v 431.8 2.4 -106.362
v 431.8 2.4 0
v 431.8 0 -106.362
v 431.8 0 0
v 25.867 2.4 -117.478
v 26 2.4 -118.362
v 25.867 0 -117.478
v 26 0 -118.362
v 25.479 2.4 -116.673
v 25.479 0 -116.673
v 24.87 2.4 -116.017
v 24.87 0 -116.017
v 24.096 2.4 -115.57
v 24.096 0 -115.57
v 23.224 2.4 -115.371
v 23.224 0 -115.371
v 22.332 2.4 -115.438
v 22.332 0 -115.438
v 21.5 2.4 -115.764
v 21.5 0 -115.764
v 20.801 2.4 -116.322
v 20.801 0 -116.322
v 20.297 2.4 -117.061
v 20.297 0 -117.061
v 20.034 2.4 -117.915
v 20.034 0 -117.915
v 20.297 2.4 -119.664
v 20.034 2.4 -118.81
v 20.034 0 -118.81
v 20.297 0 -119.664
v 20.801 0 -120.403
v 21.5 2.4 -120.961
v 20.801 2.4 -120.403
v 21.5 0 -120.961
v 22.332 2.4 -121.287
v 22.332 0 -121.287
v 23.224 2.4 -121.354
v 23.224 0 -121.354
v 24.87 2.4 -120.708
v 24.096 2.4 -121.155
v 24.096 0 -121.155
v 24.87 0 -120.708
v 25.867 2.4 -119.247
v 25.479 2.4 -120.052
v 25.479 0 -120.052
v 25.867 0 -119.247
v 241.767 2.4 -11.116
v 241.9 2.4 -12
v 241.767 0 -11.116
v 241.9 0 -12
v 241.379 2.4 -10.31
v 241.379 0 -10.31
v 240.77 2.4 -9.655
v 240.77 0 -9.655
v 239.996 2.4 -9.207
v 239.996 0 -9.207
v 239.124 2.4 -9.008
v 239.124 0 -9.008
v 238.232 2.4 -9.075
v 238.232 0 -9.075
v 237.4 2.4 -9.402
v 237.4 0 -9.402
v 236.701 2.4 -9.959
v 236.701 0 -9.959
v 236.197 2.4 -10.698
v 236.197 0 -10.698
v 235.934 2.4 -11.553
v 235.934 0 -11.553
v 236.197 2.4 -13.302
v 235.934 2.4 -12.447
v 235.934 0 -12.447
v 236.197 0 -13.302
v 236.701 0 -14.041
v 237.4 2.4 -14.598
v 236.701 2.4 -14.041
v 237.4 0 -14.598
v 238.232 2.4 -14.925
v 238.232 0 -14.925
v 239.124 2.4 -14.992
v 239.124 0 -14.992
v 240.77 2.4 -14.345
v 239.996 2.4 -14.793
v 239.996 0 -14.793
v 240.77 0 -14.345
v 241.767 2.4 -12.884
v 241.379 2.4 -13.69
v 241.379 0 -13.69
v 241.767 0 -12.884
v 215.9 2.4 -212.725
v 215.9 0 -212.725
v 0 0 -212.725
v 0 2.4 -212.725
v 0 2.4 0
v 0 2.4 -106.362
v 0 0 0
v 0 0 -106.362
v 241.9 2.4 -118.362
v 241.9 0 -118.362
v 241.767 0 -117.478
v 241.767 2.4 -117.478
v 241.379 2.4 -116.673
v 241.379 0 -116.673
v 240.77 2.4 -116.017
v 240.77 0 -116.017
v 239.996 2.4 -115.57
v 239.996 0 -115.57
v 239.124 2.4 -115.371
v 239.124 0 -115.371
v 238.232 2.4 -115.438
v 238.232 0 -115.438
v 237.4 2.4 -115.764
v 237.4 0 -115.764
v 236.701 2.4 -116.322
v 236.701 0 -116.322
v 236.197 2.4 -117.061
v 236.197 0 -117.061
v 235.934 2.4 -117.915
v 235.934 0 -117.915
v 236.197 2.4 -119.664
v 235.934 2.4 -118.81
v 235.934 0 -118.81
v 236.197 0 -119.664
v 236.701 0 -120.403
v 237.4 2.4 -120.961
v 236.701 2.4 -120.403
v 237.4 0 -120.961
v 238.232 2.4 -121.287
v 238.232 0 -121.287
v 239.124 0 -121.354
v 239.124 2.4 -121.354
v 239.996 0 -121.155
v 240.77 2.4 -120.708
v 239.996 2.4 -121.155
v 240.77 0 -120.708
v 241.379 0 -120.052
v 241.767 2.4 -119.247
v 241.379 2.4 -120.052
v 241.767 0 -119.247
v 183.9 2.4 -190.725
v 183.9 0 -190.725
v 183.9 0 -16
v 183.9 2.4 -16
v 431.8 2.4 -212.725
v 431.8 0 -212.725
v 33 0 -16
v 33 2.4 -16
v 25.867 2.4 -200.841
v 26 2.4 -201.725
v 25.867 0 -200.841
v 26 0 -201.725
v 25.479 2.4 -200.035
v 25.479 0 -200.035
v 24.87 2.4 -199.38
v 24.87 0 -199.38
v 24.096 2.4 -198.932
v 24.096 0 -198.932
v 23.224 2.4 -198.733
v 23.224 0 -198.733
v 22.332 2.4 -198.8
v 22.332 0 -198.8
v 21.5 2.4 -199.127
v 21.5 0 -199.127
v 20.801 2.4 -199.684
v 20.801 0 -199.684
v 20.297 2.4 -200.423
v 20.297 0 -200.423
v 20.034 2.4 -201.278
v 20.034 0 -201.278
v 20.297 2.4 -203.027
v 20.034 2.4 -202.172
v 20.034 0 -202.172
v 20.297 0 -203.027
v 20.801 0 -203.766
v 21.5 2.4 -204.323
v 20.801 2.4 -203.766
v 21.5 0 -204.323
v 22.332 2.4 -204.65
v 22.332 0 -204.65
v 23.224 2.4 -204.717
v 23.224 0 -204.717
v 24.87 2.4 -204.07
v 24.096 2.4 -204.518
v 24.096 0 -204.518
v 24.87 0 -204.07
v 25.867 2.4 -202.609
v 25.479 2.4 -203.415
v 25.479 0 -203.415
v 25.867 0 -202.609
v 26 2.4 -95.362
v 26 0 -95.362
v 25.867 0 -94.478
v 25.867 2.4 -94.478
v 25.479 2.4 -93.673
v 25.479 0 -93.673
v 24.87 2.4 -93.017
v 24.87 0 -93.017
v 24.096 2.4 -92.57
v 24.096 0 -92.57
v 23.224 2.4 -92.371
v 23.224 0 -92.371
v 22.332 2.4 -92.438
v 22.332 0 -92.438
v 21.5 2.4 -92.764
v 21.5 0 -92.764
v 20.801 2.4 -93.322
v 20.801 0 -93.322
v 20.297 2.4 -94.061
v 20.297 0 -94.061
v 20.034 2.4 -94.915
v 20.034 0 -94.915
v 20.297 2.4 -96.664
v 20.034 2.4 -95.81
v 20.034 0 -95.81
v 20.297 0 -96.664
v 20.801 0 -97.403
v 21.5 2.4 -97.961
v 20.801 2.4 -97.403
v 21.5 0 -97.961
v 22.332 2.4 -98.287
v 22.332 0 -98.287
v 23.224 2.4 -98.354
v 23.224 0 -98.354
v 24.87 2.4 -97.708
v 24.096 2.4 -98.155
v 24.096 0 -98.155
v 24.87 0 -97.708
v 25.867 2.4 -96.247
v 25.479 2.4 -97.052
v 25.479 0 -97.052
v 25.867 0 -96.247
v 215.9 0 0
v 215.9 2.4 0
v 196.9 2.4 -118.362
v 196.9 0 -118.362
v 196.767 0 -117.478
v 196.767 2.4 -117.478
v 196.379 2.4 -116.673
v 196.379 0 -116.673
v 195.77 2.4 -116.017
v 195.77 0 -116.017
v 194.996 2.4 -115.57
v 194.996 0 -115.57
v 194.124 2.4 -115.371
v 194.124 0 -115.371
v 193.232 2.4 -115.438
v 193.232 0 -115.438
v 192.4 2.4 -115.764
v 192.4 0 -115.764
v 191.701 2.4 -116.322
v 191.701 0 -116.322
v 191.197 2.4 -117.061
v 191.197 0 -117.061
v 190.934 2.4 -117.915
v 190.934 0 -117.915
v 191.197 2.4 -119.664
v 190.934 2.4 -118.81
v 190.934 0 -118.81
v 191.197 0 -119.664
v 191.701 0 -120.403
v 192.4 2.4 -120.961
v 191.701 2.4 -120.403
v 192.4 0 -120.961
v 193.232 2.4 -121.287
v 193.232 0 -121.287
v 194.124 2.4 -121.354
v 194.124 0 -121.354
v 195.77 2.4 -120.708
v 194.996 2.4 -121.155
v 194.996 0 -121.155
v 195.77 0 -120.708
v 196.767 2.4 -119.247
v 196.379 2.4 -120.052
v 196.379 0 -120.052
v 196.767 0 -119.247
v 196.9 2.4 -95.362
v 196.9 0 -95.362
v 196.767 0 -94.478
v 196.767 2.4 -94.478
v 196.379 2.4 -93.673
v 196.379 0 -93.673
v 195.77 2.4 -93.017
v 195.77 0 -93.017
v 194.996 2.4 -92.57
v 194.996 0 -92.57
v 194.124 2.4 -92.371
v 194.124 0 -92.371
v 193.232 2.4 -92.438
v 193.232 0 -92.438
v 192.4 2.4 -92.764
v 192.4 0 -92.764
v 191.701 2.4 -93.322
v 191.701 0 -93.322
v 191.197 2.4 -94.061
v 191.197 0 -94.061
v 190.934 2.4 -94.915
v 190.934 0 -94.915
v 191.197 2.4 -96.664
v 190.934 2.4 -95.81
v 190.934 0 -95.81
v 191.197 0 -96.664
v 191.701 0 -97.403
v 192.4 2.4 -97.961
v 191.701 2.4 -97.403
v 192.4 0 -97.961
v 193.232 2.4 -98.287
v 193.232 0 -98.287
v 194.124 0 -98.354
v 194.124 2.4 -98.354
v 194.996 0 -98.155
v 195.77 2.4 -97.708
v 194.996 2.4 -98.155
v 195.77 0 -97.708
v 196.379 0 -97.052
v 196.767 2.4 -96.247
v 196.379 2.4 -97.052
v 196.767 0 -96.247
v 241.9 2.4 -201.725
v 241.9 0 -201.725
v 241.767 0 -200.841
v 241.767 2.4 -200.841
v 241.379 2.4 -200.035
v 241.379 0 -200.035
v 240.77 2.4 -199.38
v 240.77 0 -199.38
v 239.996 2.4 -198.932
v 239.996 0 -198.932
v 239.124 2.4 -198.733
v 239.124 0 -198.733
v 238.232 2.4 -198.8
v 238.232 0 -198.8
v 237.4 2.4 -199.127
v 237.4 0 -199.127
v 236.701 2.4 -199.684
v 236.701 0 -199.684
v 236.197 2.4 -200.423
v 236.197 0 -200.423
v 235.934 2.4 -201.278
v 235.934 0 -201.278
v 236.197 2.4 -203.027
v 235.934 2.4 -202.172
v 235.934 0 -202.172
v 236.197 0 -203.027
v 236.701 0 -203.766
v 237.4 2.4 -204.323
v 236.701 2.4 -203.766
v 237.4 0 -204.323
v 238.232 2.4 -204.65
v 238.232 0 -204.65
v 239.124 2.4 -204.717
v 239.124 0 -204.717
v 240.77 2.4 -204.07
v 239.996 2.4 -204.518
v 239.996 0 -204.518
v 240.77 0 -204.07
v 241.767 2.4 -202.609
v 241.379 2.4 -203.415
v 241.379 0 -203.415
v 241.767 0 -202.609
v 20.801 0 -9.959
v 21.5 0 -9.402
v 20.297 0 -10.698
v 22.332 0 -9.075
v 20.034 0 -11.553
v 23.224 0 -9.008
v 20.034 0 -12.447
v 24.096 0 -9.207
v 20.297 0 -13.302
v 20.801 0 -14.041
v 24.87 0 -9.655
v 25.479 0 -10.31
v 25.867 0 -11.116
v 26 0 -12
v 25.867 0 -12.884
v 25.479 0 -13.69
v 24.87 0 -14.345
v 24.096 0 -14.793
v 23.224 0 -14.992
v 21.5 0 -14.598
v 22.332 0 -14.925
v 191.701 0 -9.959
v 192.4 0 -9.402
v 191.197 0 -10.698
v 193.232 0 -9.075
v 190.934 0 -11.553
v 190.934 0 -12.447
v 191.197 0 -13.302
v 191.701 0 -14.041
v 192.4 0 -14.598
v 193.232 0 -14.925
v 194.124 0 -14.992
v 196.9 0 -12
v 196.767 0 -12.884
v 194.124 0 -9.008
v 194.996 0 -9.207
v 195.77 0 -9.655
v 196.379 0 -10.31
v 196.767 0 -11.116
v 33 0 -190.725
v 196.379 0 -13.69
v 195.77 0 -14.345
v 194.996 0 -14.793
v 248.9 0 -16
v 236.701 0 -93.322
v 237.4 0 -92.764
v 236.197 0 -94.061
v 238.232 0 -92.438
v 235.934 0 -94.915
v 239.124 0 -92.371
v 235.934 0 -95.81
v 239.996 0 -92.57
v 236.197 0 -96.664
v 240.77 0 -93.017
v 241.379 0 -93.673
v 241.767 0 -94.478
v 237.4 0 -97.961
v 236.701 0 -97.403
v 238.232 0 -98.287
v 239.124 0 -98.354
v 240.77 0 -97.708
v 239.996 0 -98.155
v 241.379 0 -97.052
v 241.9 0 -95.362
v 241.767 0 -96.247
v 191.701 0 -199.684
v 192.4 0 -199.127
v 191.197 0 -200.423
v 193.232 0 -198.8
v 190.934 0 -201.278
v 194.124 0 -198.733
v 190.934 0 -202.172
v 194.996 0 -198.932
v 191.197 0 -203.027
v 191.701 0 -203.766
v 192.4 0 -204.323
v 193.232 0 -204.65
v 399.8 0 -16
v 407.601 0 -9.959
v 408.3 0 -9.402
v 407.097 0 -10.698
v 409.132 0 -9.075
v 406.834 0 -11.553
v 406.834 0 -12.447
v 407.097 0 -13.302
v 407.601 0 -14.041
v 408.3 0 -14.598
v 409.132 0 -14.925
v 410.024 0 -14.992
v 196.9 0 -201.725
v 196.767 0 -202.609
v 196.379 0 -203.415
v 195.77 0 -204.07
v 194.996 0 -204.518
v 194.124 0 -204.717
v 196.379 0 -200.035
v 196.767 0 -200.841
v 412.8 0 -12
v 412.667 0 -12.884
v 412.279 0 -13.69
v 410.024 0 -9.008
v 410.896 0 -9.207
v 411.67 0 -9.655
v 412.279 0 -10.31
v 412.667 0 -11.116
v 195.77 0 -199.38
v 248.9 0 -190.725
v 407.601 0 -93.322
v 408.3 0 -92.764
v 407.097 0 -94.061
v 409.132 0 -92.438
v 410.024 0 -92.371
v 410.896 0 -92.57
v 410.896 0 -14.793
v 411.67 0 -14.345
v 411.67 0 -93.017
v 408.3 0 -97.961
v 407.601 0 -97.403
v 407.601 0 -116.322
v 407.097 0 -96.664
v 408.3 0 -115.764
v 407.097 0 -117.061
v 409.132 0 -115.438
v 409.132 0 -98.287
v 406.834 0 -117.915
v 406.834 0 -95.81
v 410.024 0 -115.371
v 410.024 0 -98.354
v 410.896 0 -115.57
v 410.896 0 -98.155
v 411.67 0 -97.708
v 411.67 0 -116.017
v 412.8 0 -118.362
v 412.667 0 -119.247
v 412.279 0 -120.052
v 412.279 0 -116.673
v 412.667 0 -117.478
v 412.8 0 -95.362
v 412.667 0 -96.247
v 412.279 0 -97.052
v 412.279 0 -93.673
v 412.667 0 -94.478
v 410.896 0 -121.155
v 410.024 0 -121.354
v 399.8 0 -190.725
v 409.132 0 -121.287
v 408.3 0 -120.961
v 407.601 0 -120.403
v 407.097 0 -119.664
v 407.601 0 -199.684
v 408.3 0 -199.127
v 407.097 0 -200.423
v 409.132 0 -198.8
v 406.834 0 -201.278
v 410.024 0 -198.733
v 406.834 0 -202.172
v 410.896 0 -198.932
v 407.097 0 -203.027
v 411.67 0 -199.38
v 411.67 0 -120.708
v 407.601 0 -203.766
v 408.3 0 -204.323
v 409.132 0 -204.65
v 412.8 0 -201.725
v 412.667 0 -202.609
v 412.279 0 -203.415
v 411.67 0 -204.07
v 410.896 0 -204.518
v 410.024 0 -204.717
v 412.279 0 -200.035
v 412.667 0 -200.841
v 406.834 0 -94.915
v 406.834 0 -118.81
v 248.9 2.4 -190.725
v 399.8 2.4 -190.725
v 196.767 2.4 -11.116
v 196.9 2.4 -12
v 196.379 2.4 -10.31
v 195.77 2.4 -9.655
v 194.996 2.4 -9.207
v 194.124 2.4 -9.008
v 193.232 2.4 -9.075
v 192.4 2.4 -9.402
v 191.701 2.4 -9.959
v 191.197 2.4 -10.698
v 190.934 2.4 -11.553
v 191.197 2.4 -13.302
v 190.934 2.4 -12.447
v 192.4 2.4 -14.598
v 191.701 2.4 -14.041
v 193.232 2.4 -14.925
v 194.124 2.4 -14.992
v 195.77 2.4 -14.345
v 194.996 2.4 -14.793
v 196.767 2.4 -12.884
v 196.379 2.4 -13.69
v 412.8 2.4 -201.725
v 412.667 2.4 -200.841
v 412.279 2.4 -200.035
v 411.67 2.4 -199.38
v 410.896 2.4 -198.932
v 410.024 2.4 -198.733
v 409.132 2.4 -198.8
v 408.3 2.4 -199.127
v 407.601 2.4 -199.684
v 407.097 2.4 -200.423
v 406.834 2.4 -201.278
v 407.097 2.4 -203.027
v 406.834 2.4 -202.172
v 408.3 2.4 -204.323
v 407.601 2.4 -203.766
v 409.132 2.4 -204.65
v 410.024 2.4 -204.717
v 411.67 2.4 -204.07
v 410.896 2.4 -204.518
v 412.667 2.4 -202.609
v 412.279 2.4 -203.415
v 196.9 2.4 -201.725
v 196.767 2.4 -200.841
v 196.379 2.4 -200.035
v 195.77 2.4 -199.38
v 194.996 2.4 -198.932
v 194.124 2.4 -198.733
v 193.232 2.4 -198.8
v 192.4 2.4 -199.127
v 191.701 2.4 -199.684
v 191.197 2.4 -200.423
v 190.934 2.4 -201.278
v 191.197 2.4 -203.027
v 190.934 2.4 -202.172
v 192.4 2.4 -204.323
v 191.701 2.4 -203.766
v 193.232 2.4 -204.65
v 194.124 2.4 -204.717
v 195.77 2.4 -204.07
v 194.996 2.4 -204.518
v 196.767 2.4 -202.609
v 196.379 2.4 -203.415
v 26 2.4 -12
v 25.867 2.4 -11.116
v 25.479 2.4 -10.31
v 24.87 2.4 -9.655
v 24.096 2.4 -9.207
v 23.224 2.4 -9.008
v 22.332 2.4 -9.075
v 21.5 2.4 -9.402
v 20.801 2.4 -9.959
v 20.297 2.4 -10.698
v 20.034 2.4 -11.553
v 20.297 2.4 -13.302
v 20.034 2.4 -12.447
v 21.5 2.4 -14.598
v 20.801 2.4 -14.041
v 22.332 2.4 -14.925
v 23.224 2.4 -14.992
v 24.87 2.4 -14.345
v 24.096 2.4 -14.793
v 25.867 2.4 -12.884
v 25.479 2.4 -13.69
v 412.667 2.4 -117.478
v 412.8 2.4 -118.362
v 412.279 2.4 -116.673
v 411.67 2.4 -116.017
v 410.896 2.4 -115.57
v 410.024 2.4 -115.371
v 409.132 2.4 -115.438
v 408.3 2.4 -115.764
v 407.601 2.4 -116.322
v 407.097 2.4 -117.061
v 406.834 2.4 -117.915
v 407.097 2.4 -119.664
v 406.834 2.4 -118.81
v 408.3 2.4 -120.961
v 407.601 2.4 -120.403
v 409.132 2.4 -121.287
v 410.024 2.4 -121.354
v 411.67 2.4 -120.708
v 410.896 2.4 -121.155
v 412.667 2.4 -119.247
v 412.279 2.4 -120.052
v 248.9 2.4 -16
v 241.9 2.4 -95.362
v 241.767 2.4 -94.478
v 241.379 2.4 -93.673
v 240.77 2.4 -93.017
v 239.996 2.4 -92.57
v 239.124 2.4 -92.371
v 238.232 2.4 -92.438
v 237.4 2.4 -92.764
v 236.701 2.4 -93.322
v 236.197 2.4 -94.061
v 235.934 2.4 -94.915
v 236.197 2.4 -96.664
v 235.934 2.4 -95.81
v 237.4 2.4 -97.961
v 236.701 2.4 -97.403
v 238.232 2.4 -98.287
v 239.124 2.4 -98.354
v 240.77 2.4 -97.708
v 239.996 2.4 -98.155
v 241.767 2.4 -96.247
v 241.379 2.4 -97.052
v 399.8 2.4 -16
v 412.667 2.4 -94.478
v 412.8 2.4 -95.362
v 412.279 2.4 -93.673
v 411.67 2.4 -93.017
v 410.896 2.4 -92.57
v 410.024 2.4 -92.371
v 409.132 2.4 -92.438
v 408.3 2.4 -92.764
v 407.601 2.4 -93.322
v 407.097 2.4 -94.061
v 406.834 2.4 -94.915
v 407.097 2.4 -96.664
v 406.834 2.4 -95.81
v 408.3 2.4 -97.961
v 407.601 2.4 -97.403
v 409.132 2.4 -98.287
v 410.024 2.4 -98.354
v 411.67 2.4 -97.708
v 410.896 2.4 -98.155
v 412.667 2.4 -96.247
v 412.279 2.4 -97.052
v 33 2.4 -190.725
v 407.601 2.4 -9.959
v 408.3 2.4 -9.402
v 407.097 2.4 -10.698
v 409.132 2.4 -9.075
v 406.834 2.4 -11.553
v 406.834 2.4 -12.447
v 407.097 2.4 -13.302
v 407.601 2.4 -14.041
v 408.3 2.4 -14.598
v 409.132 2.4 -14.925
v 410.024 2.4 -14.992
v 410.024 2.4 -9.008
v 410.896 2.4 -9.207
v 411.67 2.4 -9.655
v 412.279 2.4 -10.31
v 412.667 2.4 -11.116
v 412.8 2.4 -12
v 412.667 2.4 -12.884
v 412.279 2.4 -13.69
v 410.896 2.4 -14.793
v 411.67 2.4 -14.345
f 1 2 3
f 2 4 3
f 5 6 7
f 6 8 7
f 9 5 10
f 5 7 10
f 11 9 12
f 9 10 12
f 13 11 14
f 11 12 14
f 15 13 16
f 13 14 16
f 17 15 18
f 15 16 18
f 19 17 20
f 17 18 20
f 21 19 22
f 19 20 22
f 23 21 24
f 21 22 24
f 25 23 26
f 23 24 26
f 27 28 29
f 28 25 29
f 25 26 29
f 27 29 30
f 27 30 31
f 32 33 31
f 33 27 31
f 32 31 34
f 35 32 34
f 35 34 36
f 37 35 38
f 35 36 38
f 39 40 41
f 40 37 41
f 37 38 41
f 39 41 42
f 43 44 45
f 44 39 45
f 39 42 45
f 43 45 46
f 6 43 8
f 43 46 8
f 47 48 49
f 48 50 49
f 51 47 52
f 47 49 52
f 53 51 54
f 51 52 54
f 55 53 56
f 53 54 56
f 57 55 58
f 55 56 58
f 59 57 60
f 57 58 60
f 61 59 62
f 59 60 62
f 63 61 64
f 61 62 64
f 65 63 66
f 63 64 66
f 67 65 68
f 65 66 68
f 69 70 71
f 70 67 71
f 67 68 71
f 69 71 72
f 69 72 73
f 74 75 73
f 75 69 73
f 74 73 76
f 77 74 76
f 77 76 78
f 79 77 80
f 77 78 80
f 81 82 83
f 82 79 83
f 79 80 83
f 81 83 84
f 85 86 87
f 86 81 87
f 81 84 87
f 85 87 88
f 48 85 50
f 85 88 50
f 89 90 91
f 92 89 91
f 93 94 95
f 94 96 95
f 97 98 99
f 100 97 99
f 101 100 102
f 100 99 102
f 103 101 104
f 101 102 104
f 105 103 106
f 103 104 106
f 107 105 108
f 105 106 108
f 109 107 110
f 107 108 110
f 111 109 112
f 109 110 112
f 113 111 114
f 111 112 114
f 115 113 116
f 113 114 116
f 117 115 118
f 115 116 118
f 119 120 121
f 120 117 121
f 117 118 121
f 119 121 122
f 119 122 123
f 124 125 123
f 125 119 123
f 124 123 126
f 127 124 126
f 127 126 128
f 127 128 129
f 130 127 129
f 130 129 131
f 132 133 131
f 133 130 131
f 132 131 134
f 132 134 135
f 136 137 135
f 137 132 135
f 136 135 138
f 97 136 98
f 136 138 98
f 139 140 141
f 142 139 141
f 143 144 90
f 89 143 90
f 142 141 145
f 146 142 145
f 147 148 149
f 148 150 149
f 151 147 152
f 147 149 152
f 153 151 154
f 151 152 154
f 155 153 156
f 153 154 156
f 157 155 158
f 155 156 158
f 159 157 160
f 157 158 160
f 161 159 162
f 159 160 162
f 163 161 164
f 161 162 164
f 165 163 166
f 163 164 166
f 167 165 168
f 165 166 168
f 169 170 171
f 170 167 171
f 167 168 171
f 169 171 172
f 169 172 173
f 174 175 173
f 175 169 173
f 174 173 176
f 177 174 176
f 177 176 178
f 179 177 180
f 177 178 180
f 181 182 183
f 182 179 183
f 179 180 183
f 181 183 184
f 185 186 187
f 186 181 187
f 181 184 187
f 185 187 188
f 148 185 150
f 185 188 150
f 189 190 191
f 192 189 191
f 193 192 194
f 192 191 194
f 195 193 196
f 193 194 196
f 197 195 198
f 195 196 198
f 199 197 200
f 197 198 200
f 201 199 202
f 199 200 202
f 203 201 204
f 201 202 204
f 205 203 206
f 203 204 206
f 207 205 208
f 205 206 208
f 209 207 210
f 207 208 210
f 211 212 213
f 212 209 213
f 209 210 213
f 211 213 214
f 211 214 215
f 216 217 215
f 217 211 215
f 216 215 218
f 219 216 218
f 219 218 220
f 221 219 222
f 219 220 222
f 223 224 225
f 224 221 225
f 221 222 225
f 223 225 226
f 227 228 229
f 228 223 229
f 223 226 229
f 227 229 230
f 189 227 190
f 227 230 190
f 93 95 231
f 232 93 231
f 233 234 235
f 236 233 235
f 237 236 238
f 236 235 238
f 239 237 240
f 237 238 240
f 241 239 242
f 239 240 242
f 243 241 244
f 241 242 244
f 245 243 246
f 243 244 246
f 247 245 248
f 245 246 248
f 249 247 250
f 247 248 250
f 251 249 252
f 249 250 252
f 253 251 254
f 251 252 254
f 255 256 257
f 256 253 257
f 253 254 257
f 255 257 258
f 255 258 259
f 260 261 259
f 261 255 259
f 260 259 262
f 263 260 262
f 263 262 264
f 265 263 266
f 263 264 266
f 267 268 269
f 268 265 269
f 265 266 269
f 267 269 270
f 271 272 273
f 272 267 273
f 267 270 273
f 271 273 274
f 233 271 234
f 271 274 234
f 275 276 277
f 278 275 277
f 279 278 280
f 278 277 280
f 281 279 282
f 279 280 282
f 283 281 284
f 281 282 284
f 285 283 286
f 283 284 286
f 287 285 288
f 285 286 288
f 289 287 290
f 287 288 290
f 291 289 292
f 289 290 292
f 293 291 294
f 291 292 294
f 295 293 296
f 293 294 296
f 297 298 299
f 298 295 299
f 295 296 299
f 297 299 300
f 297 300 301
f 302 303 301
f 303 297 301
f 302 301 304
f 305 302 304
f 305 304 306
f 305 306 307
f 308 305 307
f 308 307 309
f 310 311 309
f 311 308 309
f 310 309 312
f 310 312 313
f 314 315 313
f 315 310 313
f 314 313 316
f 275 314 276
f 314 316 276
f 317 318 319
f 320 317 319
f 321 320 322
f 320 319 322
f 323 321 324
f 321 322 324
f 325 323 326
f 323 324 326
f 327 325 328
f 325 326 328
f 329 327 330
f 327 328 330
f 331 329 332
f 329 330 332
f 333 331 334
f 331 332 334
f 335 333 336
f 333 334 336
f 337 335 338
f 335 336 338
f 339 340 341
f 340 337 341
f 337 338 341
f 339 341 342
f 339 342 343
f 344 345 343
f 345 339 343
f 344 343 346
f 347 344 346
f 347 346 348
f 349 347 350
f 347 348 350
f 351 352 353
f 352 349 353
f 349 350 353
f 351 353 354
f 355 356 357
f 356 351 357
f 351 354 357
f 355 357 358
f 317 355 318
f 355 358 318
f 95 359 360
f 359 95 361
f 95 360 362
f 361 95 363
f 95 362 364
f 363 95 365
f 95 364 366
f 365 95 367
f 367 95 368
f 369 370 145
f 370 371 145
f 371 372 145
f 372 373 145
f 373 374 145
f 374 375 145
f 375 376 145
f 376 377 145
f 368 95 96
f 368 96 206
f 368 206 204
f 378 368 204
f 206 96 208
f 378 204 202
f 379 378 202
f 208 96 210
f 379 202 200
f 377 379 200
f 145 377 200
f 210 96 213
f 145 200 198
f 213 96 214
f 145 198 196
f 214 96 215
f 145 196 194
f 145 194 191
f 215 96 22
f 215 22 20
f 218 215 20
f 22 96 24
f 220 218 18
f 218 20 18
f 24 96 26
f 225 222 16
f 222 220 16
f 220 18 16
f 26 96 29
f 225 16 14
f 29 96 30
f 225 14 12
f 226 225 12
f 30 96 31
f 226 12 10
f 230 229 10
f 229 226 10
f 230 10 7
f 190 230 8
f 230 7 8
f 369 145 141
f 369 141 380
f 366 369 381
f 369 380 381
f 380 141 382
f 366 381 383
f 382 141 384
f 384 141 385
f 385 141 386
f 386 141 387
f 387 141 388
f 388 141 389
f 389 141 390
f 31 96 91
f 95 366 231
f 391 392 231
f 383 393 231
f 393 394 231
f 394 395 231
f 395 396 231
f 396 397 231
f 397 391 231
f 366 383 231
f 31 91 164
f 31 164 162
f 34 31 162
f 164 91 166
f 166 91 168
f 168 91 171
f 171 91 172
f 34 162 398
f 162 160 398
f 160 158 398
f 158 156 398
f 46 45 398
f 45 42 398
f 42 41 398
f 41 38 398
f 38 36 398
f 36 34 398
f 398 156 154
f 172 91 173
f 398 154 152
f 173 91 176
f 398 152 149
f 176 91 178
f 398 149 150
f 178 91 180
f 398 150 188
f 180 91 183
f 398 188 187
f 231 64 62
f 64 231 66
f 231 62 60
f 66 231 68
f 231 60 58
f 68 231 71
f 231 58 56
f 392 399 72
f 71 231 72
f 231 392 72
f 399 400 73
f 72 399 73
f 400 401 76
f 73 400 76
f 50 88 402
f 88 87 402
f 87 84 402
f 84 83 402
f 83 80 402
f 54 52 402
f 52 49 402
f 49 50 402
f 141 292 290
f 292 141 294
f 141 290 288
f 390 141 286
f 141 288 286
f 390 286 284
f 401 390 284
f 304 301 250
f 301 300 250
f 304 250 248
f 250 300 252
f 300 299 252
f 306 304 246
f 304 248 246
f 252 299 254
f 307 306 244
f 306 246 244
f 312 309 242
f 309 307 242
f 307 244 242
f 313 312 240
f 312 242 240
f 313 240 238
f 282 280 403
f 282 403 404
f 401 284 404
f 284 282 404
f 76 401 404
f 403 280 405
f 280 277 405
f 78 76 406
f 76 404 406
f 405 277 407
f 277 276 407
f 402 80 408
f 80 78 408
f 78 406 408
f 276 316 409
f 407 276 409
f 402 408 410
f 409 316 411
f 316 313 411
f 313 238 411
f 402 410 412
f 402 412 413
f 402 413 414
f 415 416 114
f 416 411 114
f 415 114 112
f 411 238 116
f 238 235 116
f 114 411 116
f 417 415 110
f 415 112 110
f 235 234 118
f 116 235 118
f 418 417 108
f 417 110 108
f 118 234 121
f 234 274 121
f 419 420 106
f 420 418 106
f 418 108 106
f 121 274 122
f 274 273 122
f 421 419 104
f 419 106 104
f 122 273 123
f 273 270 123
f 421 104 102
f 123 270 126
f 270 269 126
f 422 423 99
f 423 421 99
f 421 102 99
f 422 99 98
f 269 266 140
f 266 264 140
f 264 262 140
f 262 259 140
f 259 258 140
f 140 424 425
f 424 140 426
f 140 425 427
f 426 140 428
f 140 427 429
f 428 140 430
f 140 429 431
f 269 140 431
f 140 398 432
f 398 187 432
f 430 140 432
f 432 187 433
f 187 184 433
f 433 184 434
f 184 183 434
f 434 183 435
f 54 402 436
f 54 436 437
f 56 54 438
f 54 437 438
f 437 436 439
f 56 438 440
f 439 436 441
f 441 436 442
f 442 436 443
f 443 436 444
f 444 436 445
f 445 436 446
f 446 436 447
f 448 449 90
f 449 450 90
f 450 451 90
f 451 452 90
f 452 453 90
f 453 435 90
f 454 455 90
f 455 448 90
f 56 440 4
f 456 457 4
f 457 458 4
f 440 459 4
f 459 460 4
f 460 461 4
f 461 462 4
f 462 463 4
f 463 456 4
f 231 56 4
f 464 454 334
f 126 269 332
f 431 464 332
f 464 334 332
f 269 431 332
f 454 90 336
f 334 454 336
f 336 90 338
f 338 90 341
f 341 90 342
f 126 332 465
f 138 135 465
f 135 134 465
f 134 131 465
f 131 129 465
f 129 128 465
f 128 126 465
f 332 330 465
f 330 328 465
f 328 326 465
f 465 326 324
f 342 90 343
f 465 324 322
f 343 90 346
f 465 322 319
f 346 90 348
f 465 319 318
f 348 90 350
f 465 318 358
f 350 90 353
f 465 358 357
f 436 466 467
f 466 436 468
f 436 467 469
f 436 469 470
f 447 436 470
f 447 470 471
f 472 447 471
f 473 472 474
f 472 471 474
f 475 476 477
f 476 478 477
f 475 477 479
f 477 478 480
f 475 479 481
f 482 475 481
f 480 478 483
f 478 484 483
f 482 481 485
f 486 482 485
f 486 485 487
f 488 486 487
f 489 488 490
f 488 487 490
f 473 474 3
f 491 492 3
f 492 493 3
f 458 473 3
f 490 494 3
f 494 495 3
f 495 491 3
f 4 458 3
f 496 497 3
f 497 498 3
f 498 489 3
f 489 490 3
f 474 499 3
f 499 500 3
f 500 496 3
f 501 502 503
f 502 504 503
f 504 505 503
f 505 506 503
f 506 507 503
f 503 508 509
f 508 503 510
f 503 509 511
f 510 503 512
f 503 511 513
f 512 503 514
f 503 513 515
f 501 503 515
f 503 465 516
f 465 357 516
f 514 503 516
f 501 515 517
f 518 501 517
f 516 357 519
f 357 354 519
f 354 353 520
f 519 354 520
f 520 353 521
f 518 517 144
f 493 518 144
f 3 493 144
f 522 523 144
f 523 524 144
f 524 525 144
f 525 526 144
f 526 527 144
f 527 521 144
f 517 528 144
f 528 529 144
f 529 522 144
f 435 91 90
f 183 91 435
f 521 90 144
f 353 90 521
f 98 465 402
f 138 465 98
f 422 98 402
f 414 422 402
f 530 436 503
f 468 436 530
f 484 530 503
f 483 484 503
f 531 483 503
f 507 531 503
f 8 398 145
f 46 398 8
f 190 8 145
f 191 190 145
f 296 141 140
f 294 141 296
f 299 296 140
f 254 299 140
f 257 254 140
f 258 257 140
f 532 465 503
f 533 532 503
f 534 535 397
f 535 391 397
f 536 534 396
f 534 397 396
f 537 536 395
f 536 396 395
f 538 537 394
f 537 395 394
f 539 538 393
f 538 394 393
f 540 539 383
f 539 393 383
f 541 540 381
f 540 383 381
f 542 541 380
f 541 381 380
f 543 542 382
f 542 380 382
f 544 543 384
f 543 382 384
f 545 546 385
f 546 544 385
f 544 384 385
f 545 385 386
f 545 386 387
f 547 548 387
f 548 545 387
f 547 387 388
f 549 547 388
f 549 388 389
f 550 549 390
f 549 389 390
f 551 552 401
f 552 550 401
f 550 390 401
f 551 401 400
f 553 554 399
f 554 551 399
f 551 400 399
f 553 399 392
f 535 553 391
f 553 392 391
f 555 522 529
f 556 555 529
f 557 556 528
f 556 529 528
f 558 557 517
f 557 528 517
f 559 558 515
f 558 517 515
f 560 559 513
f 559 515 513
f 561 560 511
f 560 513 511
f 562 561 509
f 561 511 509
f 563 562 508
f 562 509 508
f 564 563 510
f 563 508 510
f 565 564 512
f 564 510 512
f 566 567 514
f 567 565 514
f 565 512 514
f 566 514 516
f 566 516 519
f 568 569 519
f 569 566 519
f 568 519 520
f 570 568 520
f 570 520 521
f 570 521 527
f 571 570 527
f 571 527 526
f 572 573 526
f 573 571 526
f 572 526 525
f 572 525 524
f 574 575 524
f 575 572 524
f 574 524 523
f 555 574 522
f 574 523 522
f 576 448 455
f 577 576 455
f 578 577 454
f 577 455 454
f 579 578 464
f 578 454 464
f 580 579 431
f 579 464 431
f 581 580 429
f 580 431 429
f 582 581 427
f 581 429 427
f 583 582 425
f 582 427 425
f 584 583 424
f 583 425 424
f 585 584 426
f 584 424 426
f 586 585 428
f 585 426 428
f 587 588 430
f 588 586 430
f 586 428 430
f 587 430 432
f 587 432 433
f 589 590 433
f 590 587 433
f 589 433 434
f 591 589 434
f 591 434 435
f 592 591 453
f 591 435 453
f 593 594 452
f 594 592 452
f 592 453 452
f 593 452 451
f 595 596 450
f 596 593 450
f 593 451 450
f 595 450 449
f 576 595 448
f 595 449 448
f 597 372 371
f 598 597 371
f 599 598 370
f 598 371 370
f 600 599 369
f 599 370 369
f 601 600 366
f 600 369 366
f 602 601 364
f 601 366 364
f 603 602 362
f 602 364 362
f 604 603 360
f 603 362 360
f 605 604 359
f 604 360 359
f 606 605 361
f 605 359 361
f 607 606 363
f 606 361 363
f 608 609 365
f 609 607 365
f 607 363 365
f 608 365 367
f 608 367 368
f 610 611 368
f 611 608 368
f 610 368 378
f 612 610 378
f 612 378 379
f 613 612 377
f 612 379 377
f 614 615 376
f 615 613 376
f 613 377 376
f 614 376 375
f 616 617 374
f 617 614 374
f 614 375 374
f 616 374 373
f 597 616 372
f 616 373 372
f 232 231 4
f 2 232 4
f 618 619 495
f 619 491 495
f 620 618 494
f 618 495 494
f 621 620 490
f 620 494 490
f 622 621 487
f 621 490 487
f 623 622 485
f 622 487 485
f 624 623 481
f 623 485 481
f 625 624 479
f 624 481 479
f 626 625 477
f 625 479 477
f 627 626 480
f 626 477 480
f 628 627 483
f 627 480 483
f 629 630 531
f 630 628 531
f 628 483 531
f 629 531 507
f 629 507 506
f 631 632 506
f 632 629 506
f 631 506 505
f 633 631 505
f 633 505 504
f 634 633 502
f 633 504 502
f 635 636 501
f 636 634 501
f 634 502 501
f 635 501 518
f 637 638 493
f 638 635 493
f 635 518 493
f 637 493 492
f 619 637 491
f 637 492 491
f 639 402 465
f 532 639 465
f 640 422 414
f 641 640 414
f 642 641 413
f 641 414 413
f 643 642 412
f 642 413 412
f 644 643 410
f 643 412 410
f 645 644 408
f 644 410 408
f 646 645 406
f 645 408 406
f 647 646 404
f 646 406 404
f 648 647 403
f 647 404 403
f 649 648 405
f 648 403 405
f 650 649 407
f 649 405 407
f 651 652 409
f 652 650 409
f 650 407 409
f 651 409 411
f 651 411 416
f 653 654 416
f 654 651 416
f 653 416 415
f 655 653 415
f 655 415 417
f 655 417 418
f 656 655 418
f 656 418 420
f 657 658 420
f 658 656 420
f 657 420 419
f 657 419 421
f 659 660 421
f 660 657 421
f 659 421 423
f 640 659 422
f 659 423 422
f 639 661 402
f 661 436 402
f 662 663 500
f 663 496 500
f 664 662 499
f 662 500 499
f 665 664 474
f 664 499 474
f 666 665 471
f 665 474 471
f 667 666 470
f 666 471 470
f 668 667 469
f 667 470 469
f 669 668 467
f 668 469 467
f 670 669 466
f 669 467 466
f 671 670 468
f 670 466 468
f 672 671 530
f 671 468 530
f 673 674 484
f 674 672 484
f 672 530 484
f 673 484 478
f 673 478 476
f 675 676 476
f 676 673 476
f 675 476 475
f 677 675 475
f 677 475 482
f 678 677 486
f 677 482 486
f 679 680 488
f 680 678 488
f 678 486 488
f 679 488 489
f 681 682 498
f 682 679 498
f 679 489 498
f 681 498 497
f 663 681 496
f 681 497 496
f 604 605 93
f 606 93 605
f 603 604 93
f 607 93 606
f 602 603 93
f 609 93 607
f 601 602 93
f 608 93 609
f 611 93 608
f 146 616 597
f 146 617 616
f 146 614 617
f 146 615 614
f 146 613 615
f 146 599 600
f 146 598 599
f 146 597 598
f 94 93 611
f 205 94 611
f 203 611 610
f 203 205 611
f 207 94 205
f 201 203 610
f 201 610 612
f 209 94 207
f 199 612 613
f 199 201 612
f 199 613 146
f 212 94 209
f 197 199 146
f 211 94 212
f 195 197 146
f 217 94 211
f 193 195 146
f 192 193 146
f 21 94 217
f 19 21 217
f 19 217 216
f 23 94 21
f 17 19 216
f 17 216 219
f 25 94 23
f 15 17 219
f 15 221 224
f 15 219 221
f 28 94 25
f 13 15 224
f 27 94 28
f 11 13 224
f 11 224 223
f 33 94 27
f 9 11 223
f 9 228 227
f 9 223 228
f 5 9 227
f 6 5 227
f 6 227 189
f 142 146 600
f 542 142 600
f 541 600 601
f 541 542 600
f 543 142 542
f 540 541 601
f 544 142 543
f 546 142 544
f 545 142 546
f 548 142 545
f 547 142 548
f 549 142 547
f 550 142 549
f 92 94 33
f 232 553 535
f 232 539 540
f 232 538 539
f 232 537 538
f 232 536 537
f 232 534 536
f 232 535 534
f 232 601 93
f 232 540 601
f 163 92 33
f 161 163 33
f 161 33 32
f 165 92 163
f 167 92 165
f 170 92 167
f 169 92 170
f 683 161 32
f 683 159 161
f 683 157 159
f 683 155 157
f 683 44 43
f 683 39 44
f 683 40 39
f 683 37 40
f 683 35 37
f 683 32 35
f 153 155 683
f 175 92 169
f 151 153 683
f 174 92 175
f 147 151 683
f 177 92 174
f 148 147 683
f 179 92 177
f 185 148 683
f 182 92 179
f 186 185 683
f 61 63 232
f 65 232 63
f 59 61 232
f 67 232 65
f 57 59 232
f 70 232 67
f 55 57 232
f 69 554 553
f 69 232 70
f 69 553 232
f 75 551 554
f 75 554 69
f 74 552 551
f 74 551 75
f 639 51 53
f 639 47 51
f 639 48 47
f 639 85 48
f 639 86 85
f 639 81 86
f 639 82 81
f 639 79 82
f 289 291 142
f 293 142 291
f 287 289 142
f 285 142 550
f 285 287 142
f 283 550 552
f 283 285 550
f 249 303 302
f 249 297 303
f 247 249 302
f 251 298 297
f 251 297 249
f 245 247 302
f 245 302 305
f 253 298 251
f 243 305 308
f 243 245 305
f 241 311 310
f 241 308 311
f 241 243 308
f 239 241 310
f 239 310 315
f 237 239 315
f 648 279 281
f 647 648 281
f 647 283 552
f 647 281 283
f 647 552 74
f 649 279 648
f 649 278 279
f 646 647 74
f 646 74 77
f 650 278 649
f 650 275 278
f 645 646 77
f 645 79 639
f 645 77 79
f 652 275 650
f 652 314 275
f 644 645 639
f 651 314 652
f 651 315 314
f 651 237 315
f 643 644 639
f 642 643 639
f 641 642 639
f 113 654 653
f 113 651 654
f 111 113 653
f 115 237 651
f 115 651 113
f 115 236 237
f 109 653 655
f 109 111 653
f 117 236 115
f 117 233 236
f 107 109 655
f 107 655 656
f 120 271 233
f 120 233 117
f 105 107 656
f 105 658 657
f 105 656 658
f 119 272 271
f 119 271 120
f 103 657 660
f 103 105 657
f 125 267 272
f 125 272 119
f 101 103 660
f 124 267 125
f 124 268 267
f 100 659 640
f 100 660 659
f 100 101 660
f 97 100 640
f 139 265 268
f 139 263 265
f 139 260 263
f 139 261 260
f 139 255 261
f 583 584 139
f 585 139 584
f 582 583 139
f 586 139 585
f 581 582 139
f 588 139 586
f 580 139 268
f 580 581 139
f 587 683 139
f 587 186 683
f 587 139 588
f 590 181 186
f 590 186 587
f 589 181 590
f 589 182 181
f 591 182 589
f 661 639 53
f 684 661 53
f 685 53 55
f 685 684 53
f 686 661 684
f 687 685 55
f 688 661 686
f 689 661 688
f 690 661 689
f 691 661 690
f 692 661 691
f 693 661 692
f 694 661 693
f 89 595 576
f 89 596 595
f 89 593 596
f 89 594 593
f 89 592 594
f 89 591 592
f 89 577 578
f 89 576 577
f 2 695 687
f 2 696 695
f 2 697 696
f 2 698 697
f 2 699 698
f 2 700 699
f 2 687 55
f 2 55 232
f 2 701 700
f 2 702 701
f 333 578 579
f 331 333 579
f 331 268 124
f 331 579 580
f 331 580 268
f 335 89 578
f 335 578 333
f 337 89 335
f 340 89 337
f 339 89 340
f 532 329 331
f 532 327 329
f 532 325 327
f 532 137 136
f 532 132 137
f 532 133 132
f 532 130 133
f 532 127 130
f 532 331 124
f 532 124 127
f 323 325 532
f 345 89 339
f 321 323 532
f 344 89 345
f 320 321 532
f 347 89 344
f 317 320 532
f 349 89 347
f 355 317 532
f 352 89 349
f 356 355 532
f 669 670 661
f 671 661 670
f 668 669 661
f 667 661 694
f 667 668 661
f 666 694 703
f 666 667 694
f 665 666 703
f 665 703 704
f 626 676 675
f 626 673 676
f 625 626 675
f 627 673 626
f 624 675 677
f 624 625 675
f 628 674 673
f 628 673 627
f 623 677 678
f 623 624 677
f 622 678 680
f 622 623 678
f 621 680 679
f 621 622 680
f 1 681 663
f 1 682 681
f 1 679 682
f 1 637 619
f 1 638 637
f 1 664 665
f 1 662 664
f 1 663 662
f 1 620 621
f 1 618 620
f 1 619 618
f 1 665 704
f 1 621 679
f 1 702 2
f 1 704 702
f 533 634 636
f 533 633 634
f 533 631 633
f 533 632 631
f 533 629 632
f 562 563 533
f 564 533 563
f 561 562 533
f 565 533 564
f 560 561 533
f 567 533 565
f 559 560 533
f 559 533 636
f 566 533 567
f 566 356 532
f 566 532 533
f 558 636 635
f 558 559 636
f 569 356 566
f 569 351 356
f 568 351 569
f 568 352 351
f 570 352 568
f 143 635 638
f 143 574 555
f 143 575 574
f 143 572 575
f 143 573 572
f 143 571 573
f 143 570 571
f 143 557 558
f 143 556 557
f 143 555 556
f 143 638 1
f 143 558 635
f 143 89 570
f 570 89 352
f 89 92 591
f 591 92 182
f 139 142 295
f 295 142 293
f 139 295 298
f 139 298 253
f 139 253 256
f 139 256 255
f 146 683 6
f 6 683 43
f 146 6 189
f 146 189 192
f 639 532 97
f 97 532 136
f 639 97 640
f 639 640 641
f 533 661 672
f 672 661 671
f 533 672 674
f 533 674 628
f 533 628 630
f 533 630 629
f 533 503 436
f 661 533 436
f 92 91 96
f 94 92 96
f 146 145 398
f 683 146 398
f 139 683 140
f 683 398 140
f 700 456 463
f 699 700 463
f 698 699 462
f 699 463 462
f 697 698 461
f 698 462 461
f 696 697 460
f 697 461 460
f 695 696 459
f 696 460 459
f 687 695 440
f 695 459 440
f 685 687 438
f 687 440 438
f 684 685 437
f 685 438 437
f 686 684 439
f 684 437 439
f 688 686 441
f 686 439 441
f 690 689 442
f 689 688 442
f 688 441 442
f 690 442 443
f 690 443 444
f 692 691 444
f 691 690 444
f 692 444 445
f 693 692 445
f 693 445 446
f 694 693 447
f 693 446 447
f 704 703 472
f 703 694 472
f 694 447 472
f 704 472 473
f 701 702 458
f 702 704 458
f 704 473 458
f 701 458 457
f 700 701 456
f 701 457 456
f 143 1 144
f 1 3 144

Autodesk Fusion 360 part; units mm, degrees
sketch "Sketch1" plane through (0, 0, 0) normal (0, 1, 0) x (1, 0, 0)
  line L0 (0, 0) -> (215.9, 0)
  line L1 (215.9, 0) -> (215.9, 106.3625) construction
  line L2 (215.9, 106.3625) -> (0, 106.3625) construction
  line L3 (0, 106.3625) -> (0, 0)
  line L4 (23, 12) -> (193.9, 12) construction
  line L5 (193.9, 12) -> (193.9, 95.3625) construction
  line L6 (193.9, 95.3625) -> (23, 95.3625) construction
  line L7 (23, 95.3625) -> (23, 12) construction
  circle A0 centre (23, 95.3625) radius 3
  circle A1 centre (23, 12) radius 3
  circle A2 centre (193.9, 12) radius 3
  circle A3 centre (193.9, 95.3625) radius 3
  line L8 (431.8, 0) -> (431.8, 106.3625)
  line L9 (215.9, 0) -> (431.8, 0)
  line L10 (431.8, 106.3625) -> (215.9, 106.3625) construction
  line L11 (215.9, 106.3625) -> (215.9, 0) construction
  line L12 (409.8, 12) -> (409.8, 95.3625) construction
  line L13 (409.8, 95.3625) -> (238.9, 95.3625) construction
  circle A4 centre (409.8, 95.3625) radius 3
  circle A5 centre (238.9, 95.3625) radius 3
  circle A6 centre (409.8, 12) radius 3
  line L14 (238.9, 95.3625) -> (238.9, 12) construction
  line L15 (238.9, 12) -> (409.8, 12) construction
  circle A7 centre (238.9, 12) radius 3
  line L16 (215.9, 106.3625) -> (215.9, 212.725) construction
  line L17 (0, 106.3625) -> (215.9, 106.3625) construction
  line L18 (215.9, 212.725) -> (0, 212.725)
  line L19 (0, 212.725) -> (0, 106.3625)
  line L20 (193.9, 118.3625) -> (193.9, 201.725) construction
  line L21 (193.9, 201.725) -> (23, 201.725) construction
  circle A8 centre (193.9, 201.725) radius 3
  circle A9 centre (23, 201.725) radius 3
  circle A10 centre (193.9, 118.3625) radius 3
  line L22 (23, 201.725) -> (23, 118.3625) construction
  line L23 (23, 118.3625) -> (193.9, 118.3625) construction
  circle A11 centre (23, 118.3625) radius 3
  line L24 (431.8, 106.3625) -> (431.8, 212.725)
  line L25 (215.9, 106.3625) -> (431.8, 106.3625) construction
  line L26 (431.8, 212.725) -> (215.9, 212.725)
  line L27 (215.9, 212.725) -> (215.9, 106.3625) construction
  line L28 (409.8, 118.3625) -> (409.8, 201.725) construction
  line L29 (409.8, 201.725) -> (238.9, 201.725) construction
  circle A12 centre (409.8, 201.725) radius 3
  circle A13 centre (238.9, 201.725) radius 3
  circle A14 centre (409.8, 118.3625) radius 3
  line L30 (238.9, 201.725) -> (238.9, 118.3625) construction
  line L31 (238.9, 118.3625) -> (409.8, 118.3625) construction
  circle A15 centre (238.9, 118.3625) radius 3
  line L32 (33, 190.725) -> (183.9, 190.725)
  line L33 (183.9, 190.725) -> (183.9, 16)
  line L34 (183.9, 16) -> (33, 16)
  line L35 (33, 16) -> (33, 190.725)
  line L36 (248.9, 190.725) -> (399.8, 190.725)
  line L37 (399.8, 190.725) -> (399.8, 16)
  line L38 (399.8, 16) -> (248.9, 16)
  line L39 (248.9, 16) -> (248.9, 190.725)
  point P0 (215.9, 0)
  point P1 (0, 106.3625)
  point P2 (215.9, 106.3625)
  dimension "d35" = 106.3625
  dimension "d36" = 215.9
  dimension "d37" = 23
  dimension "d38" = 11
  dimension "d39" = 12
  dimension "d40" = 22
  dimension "d41" = 6
  dimension "d42" = 6
  dimension "d43" = 6
  dimension "d44" = 6
  dimension "d47" = 215.9
  dimension "d48" = 106.3625
  dimension "d49" = 10
  dimension "d51" = 11
  dimension "d52" = 4
  dimension "d53" = 10
  dimension "d54" = 10
  dimension "d55" = 11
  dimension "d56" = 10
  dimension "d57" = 4
extrude "Extrude1" add sketch "Sketch1" along normal blind 2.4
sketch "export" plane through (0, 2.4, 0) normal (0, 1, 0) x (-1, 0, 0)
  circle A0 centre (-23, -12) radius 3
  circle A1 centre (-23, -118.3625) radius 3
  line L0 (-399.8, -16) -> (-248.9, -16)
  line L1 (-248.9, -16) -> (-248.9, -190.725)
  line L2 (-248.9, -190.725) -> (-399.8, -190.725)
  line L3 (-399.8, -190.725) -> (-399.8, -16)
  circle A2 centre (-193.9, -12) radius 3
  circle A3 centre (-409.8, -118.3625) radius 3
  circle A4 centre (-23, -95.3625) radius 3
  circle A5 centre (-238.9, -201.725) radius 3
  circle A6 centre (-409.8, -201.725) radius 3
  circle A7 centre (-238.9, -118.3625) radius 3
  circle A8 centre (-23, -201.725) radius 3
  circle A9 centre (-193.9, -118.3625) radius 3
  line L4 (-183.9, -16) -> (-33, -16)
  line L5 (-33, -16) -> (-33, -190.725)
  line L6 (-33, -190.725) -> (-183.9, -190.725)
  line L7 (-183.9, -190.725) -> (-183.9, -16)
  circle A10 centre (-193.9, -95.3625) radius 3
  circle A11 centre (-193.9, -201.725) radius 3
  circle A12 centre (-409.8, -95.3625) radius 3
  circle A13 centre (-238.9, -12) radius 3
  circle A14 centre (-409.8, -12) radius 3
  circle A15 centre (-238.9, -95.3625) radius 3
  line L8 (-431.8, -212.725) -> (0, -212.725)
  line L9 (0, -212.725) -> (0, 0)
  line L10 (0, 0) -> (-431.8, 0)
  line L11 (-431.8, 0) -> (-431.8, -212.725)
equation "d35 = 8.375 in / 2"
equation "d36 = 17 in / 2"
equation "d42 = d41"
equation "d43 = d41"
equation "d44 = d41"
equation "d51 = d38"
equation "d52 = d51 - 7 mm"
equation "d53 = d49"
equation "d54 = d53"
equation "d55 = d51"
equation "d56 = d54"
equation "d57 = d52"
